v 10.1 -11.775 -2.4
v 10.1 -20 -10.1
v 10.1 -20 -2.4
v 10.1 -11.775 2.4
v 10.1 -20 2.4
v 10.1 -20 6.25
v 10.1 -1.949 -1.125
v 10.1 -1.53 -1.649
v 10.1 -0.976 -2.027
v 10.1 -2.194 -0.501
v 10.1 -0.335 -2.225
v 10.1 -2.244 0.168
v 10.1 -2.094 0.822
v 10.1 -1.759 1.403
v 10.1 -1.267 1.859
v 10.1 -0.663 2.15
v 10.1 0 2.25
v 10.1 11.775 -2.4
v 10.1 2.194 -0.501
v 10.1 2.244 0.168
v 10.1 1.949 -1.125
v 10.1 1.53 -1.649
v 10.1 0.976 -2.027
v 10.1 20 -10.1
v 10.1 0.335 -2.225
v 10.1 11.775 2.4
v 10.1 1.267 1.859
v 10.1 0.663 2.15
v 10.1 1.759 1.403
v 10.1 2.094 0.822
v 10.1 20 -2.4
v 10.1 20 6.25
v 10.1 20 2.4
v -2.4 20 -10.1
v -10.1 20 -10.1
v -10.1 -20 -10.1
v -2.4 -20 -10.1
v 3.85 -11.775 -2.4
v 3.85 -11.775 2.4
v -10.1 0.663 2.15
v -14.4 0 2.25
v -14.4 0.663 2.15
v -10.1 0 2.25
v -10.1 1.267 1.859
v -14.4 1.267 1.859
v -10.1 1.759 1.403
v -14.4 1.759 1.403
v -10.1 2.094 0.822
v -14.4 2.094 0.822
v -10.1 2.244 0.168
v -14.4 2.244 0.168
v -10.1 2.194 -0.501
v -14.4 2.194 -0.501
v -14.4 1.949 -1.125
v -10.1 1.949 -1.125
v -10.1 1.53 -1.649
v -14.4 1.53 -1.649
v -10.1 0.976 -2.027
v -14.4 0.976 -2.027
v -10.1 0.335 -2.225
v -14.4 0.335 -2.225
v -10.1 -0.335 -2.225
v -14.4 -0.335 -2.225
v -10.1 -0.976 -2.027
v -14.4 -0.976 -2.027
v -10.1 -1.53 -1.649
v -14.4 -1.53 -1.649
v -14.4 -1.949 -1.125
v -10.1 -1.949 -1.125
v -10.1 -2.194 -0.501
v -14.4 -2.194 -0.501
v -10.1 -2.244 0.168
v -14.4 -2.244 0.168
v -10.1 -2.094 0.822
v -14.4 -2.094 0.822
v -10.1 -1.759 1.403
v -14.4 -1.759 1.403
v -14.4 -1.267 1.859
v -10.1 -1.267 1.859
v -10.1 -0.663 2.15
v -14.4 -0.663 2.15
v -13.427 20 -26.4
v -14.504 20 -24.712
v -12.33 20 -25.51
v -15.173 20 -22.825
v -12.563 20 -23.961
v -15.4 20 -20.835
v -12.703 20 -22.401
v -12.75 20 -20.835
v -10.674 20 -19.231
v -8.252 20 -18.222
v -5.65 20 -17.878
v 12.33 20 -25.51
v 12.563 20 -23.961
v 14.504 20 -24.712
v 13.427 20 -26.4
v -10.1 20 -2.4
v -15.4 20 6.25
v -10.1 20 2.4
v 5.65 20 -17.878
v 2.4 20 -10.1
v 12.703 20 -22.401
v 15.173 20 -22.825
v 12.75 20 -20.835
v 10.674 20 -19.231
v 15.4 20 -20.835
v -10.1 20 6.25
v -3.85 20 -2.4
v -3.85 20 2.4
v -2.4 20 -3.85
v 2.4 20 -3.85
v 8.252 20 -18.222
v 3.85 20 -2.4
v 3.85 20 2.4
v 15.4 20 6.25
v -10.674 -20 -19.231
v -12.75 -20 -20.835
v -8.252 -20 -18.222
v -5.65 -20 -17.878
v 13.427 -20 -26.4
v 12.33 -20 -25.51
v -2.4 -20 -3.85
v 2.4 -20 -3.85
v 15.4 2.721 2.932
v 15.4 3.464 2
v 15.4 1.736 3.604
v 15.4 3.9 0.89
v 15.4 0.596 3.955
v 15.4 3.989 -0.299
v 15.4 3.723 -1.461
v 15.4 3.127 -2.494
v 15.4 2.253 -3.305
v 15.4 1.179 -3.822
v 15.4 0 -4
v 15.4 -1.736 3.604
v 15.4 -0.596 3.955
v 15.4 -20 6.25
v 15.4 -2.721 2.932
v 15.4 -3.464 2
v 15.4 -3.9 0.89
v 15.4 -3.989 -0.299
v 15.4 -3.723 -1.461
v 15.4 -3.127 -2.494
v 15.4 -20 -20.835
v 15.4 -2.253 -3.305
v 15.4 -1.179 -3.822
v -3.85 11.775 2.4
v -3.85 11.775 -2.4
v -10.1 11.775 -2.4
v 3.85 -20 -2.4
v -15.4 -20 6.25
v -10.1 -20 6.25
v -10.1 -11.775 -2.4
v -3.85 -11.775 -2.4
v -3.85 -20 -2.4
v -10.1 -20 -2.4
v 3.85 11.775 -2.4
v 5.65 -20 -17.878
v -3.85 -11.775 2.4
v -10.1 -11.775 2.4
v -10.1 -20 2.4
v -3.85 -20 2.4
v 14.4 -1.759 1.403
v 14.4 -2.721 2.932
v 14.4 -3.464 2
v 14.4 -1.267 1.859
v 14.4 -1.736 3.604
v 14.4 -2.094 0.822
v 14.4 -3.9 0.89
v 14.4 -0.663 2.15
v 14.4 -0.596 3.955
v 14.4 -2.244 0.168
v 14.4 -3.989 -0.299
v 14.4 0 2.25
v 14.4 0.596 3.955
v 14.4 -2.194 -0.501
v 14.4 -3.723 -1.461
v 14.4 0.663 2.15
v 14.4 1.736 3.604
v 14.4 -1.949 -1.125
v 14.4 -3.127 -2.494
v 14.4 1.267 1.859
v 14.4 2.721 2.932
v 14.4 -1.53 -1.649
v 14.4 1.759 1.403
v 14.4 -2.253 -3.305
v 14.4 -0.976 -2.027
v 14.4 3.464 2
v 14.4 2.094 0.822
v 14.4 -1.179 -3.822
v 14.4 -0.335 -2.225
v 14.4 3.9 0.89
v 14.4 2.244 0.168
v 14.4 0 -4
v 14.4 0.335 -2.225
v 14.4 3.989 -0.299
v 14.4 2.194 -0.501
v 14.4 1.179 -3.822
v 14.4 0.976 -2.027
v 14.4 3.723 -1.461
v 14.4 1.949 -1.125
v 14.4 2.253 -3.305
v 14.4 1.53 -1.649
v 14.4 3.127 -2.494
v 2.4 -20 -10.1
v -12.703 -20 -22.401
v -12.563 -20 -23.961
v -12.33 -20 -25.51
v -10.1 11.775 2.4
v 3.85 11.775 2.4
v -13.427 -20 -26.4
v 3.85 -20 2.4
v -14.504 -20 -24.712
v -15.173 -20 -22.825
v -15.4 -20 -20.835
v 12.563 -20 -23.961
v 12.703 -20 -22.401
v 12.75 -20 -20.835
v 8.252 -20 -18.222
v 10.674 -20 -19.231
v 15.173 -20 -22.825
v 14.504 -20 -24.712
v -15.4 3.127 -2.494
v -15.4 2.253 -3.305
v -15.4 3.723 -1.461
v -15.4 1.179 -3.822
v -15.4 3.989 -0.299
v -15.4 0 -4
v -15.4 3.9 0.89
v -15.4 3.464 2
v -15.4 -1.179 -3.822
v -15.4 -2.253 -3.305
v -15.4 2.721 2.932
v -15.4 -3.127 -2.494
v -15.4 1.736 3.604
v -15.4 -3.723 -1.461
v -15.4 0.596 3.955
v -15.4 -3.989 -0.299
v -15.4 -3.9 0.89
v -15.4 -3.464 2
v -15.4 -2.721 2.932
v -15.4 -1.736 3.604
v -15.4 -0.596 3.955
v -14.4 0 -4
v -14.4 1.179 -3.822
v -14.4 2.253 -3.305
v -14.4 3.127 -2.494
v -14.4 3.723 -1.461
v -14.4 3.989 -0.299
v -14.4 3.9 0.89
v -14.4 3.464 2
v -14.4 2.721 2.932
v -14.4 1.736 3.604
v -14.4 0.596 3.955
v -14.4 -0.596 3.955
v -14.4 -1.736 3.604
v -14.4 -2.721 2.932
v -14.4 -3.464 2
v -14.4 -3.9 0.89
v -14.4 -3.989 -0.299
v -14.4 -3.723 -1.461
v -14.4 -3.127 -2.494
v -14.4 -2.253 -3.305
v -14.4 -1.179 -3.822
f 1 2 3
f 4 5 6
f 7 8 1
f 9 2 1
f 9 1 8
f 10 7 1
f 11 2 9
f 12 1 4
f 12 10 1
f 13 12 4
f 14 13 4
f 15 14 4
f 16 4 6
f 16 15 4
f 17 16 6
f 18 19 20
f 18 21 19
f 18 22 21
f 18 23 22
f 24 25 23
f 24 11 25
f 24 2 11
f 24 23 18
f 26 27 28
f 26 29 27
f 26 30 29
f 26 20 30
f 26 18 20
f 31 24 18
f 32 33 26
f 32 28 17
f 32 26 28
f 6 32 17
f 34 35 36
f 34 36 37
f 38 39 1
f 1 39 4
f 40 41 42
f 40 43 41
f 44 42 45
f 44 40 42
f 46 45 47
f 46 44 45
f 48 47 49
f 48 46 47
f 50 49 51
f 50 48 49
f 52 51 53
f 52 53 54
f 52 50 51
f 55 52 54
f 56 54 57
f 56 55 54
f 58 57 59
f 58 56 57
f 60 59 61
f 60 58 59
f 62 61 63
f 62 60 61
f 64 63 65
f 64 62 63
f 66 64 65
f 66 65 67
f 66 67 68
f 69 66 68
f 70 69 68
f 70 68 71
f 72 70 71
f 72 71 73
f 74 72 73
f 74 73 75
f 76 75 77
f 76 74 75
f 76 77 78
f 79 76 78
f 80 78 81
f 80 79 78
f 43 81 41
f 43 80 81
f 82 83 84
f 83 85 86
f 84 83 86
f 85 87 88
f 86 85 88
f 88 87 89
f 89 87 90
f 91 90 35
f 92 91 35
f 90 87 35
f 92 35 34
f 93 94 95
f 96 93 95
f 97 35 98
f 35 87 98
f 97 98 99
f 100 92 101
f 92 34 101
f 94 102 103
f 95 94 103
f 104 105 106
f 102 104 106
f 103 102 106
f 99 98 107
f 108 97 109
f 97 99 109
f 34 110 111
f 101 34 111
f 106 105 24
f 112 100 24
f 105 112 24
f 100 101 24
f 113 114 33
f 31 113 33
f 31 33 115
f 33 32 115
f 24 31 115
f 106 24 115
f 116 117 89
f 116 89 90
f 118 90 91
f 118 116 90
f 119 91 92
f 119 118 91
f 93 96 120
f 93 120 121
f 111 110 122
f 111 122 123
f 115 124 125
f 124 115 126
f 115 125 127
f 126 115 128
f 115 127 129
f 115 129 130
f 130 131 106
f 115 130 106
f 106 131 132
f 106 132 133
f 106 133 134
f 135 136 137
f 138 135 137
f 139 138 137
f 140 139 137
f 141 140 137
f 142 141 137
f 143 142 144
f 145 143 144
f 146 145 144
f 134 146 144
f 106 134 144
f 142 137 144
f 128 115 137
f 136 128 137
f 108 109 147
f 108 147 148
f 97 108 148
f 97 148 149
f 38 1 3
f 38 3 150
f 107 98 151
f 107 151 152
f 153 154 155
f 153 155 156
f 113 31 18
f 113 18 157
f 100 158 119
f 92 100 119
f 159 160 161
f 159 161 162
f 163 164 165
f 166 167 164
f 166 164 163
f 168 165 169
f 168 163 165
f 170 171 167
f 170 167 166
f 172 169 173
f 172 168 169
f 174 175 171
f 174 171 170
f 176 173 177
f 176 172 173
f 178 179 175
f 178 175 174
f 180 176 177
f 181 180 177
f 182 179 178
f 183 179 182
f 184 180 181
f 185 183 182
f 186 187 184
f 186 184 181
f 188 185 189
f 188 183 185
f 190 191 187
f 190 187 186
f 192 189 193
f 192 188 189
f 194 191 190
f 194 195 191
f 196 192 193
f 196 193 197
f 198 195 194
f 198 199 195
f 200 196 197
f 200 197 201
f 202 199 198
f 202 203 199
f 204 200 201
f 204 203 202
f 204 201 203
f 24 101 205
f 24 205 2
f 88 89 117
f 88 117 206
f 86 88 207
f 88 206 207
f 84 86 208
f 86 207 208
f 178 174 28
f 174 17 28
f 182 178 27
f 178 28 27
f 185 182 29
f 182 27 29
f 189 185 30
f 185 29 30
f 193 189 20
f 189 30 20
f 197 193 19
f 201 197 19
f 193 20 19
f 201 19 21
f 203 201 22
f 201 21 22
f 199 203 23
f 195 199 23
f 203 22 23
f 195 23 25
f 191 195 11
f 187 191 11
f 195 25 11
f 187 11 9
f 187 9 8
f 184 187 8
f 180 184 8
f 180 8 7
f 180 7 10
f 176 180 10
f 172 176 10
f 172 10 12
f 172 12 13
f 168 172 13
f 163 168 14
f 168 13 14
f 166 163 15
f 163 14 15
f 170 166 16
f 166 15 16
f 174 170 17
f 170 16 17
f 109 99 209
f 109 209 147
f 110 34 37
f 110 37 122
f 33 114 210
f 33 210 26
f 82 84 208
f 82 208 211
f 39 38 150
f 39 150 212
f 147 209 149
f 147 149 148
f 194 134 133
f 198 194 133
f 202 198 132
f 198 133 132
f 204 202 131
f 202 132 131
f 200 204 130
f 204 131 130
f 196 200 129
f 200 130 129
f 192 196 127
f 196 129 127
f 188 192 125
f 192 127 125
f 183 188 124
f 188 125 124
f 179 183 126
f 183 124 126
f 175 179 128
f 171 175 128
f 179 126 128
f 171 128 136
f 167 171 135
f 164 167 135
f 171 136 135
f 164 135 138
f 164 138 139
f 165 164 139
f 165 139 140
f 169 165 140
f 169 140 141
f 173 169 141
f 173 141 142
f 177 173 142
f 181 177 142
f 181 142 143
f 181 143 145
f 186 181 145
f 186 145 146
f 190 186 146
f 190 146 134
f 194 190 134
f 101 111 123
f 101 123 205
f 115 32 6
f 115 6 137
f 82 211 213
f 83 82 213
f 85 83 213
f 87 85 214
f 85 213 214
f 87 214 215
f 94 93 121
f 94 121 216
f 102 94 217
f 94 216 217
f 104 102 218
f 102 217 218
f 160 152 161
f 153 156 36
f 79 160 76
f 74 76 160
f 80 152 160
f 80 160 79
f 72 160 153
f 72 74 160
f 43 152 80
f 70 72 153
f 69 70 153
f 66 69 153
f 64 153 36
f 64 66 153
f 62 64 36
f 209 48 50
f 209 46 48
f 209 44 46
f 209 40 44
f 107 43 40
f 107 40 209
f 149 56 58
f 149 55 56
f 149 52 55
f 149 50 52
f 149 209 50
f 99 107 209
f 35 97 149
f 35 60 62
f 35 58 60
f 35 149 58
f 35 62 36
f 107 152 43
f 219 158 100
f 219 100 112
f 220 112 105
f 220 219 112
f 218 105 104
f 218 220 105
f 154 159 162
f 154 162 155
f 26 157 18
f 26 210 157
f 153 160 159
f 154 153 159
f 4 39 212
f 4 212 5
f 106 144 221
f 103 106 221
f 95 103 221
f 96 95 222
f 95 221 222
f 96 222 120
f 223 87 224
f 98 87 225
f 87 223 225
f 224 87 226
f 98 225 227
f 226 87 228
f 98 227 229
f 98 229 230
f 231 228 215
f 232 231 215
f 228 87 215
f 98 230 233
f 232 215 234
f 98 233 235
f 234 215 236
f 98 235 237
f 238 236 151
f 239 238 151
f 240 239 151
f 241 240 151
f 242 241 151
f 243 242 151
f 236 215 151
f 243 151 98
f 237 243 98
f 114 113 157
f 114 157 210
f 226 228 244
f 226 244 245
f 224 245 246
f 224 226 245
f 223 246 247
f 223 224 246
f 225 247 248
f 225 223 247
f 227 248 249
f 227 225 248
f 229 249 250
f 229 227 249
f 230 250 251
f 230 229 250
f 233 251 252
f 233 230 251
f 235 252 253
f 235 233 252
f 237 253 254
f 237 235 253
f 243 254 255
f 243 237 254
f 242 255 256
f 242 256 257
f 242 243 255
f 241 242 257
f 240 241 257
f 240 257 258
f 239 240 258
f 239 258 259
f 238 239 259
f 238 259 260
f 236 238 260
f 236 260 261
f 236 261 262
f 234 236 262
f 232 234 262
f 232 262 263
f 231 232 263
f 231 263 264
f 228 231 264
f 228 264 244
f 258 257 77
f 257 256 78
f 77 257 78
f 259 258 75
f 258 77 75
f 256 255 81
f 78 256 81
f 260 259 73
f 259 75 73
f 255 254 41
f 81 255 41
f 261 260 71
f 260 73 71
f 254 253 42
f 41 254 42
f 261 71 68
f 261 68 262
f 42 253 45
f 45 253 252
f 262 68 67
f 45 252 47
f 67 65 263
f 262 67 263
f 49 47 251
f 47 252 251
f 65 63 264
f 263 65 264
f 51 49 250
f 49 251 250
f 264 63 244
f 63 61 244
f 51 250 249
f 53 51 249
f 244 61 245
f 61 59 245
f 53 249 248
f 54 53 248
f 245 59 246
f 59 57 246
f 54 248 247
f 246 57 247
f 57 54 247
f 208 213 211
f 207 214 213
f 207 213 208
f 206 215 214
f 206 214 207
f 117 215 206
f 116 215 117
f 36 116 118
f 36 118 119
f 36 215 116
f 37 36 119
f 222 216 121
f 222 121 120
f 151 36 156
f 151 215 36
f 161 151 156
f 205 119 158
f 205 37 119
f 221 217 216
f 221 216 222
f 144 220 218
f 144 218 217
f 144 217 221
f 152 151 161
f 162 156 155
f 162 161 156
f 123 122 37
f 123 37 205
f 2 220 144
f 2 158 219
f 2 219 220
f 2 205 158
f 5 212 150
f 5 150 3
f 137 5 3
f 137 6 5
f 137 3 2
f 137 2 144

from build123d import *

# Parameters (mm, degrees)
BOSS_EXTRU_1_DEPTH                                = 20
CHAMBRAGE_POUR_VIS_SIX_PANS_CREUX_M41_D           = 4.5
CHAMBRAGE_POUR_VIS_SIX_PANS_CREUX_M41_DEPTH       = 11.55
CHAMBRAGE_POUR_VIS_SIX_PANS_CREUX_M41_CBORE_D     = 8
CHAMBRAGE_POUR_VIS_SIX_PANS_CREUX_M41_CBORE_DEPTH = 1
ESQUISSE6_W                                       = 20.2
ESQUISSE6_H                                       = 23.55054775
ENL_V_MAT_EXTRU_1_DEPTH                           = 3
BOSS_EXTRU_3_DEPTH                                = 40
CONG_1_R                                          = 10


with BuildPart() as part:
    # Base → Boss.-Extru.1 (new, symmetric)
    with BuildSketch(Plane(origin=(0, 0, 0), x_dir=(1, 0, 0), z_dir=(0, 1, 0))):
        Polygon((-3.85, -2.4), (-3.85, 2.4), (-10.1, 2.4), (-10.1, 10.1), (-2.4, 10.1), (-2.4, 3.85), (2.4, 3.85), (2.4, 10.1), (10.1, 10.1), (10.1, 2.4), (3.85, 2.4), (3.85, -2.4), (10.1, -2.4), (10.1, -6.25), (15.4, -6.25), (15.4, 15.4), (-15.4, 15.4), (-15.4, -6.25), (-10.1, -6.25), (-10.1, -2.4), align=None)
    extrude(amount=BOSS_EXTRU_1_DEPTH, both=True)

    # Chambrage pour vis à six pans creux M41
    with Locations(Plane(origin=(15.4, 0, 0), x_dir=(0, 0, -1), z_dir=(1, 0, 0))):
        with Locations((0, 0)):
            chambrage_pour_vis_six_pans_creux_m41 = CounterBoreHole(CHAMBRAGE_POUR_VIS_SIX_PANS_CREUX_M41_D / 2, CHAMBRAGE_POUR_VIS_SIX_PANS_CREUX_M41_CBORE_D / 2, CHAMBRAGE_POUR_VIS_SIX_PANS_CREUX_M41_CBORE_DEPTH, depth=CHAMBRAGE_POUR_VIS_SIX_PANS_CREUX_M41_DEPTH)

    # Symétrie1: Chambrage pour vis à six pans creux M41 across plane
    add(chambrage_pour_vis_six_pans_creux_m41.mirror(Plane(origin=(0, 0, 0), x_dir=(0, 0, 1), z_dir=(1, 0, 0))), mode=Mode.SUBTRACT)

    # Esquisse6 → Enlèv. mat.-Extru.1 (cut, symmetric)
    with BuildSketch(Plane.XY):
        Rectangle(ESQUISSE6_W, ESQUISSE6_H)
    extrude(amount=ENL_V_MAT_EXTRU_1_DEPTH, both=True, mode=Mode.SUBTRACT)

    # Esquisse14 → Boss.-Extru.3 (add)
    with BuildSketch(Plane.XZ.offset(20)):
        with BuildLine():
            Line((-15.4, -15.4), (15.4, -15.4))
            Line((15.4, -15.4), (15.4, -17.9))
            Line((15.4, -17.9), (15.4, -20.835156926))
            ThreePointArc((15.4, -20.835156926), (14.892113101, -23.787279745), (13.42685396, -26.399940055))
            Line((13.42685396, -26.399940055), (12.329607692, -25.509925555))
            ThreePointArc((12.329607692, -25.509925555), (12.644690295, -23.181973462), (12.75, -20.835156926))
            Line((12.75, -20.835156926), (12.75, -17.87758102))
            Line((12.75, -17.87758102), (-12.75, -17.87758102))
            Line((-12.75, -17.87758102), (-12.75, -20.835156926))
            ThreePointArc((-12.75, -20.835156926), (-12.644690295, -23.181973462), (-12.329607692, -25.509925555))
            Line((-12.329607692, -25.509925555), (-13.42685396, -26.399940055))
            ThreePointArc((-13.42685396, -26.399940055), (-14.892113101, -23.787279745), (-15.4, -20.835156926))
            Line((-15.4, -20.835156926), (-15.4, -17.9))
            Line((-15.4, -17.9), (-15.4, -15.4))
        make_face()
    extrude(amount=-BOSS_EXTRU_3_DEPTH)

    # Congé1
    # the kernel refuses this fillet: 10 mm, written as the material it adds along each edge
    with BuildSketch(Plane(origin=(-12.75, -20, -17.87758102), x_dir=(0, 0, -1), z_dir=(0, 1, 0))) as cong_1_piece_1:
        with BuildLine():
            CenterArc((10, -7.099595966), CONG_1_R, 134.768371909, 45.231628091)
            Line((0, -7.099595966), (0, 0))
            Line((0, 0), (2.957575906, 0))
        make_face()
    extrude(amount=40)
    with BuildSketch(Plane(origin=(12.75, -20, -17.87758102), x_dir=(-1, 0, 0), z_dir=(0, 1, 0))) as cong_1_piece_2:
        with BuildLine():
            CenterArc((7.099595966, -10), CONG_1_R, 90, 45.231628091)
            Line((0, -2.957575906), (0, 0))
            Line((0, 0), (7.099595966, 0))
        make_face()
    extrude(amount=40)


solid = part.part
